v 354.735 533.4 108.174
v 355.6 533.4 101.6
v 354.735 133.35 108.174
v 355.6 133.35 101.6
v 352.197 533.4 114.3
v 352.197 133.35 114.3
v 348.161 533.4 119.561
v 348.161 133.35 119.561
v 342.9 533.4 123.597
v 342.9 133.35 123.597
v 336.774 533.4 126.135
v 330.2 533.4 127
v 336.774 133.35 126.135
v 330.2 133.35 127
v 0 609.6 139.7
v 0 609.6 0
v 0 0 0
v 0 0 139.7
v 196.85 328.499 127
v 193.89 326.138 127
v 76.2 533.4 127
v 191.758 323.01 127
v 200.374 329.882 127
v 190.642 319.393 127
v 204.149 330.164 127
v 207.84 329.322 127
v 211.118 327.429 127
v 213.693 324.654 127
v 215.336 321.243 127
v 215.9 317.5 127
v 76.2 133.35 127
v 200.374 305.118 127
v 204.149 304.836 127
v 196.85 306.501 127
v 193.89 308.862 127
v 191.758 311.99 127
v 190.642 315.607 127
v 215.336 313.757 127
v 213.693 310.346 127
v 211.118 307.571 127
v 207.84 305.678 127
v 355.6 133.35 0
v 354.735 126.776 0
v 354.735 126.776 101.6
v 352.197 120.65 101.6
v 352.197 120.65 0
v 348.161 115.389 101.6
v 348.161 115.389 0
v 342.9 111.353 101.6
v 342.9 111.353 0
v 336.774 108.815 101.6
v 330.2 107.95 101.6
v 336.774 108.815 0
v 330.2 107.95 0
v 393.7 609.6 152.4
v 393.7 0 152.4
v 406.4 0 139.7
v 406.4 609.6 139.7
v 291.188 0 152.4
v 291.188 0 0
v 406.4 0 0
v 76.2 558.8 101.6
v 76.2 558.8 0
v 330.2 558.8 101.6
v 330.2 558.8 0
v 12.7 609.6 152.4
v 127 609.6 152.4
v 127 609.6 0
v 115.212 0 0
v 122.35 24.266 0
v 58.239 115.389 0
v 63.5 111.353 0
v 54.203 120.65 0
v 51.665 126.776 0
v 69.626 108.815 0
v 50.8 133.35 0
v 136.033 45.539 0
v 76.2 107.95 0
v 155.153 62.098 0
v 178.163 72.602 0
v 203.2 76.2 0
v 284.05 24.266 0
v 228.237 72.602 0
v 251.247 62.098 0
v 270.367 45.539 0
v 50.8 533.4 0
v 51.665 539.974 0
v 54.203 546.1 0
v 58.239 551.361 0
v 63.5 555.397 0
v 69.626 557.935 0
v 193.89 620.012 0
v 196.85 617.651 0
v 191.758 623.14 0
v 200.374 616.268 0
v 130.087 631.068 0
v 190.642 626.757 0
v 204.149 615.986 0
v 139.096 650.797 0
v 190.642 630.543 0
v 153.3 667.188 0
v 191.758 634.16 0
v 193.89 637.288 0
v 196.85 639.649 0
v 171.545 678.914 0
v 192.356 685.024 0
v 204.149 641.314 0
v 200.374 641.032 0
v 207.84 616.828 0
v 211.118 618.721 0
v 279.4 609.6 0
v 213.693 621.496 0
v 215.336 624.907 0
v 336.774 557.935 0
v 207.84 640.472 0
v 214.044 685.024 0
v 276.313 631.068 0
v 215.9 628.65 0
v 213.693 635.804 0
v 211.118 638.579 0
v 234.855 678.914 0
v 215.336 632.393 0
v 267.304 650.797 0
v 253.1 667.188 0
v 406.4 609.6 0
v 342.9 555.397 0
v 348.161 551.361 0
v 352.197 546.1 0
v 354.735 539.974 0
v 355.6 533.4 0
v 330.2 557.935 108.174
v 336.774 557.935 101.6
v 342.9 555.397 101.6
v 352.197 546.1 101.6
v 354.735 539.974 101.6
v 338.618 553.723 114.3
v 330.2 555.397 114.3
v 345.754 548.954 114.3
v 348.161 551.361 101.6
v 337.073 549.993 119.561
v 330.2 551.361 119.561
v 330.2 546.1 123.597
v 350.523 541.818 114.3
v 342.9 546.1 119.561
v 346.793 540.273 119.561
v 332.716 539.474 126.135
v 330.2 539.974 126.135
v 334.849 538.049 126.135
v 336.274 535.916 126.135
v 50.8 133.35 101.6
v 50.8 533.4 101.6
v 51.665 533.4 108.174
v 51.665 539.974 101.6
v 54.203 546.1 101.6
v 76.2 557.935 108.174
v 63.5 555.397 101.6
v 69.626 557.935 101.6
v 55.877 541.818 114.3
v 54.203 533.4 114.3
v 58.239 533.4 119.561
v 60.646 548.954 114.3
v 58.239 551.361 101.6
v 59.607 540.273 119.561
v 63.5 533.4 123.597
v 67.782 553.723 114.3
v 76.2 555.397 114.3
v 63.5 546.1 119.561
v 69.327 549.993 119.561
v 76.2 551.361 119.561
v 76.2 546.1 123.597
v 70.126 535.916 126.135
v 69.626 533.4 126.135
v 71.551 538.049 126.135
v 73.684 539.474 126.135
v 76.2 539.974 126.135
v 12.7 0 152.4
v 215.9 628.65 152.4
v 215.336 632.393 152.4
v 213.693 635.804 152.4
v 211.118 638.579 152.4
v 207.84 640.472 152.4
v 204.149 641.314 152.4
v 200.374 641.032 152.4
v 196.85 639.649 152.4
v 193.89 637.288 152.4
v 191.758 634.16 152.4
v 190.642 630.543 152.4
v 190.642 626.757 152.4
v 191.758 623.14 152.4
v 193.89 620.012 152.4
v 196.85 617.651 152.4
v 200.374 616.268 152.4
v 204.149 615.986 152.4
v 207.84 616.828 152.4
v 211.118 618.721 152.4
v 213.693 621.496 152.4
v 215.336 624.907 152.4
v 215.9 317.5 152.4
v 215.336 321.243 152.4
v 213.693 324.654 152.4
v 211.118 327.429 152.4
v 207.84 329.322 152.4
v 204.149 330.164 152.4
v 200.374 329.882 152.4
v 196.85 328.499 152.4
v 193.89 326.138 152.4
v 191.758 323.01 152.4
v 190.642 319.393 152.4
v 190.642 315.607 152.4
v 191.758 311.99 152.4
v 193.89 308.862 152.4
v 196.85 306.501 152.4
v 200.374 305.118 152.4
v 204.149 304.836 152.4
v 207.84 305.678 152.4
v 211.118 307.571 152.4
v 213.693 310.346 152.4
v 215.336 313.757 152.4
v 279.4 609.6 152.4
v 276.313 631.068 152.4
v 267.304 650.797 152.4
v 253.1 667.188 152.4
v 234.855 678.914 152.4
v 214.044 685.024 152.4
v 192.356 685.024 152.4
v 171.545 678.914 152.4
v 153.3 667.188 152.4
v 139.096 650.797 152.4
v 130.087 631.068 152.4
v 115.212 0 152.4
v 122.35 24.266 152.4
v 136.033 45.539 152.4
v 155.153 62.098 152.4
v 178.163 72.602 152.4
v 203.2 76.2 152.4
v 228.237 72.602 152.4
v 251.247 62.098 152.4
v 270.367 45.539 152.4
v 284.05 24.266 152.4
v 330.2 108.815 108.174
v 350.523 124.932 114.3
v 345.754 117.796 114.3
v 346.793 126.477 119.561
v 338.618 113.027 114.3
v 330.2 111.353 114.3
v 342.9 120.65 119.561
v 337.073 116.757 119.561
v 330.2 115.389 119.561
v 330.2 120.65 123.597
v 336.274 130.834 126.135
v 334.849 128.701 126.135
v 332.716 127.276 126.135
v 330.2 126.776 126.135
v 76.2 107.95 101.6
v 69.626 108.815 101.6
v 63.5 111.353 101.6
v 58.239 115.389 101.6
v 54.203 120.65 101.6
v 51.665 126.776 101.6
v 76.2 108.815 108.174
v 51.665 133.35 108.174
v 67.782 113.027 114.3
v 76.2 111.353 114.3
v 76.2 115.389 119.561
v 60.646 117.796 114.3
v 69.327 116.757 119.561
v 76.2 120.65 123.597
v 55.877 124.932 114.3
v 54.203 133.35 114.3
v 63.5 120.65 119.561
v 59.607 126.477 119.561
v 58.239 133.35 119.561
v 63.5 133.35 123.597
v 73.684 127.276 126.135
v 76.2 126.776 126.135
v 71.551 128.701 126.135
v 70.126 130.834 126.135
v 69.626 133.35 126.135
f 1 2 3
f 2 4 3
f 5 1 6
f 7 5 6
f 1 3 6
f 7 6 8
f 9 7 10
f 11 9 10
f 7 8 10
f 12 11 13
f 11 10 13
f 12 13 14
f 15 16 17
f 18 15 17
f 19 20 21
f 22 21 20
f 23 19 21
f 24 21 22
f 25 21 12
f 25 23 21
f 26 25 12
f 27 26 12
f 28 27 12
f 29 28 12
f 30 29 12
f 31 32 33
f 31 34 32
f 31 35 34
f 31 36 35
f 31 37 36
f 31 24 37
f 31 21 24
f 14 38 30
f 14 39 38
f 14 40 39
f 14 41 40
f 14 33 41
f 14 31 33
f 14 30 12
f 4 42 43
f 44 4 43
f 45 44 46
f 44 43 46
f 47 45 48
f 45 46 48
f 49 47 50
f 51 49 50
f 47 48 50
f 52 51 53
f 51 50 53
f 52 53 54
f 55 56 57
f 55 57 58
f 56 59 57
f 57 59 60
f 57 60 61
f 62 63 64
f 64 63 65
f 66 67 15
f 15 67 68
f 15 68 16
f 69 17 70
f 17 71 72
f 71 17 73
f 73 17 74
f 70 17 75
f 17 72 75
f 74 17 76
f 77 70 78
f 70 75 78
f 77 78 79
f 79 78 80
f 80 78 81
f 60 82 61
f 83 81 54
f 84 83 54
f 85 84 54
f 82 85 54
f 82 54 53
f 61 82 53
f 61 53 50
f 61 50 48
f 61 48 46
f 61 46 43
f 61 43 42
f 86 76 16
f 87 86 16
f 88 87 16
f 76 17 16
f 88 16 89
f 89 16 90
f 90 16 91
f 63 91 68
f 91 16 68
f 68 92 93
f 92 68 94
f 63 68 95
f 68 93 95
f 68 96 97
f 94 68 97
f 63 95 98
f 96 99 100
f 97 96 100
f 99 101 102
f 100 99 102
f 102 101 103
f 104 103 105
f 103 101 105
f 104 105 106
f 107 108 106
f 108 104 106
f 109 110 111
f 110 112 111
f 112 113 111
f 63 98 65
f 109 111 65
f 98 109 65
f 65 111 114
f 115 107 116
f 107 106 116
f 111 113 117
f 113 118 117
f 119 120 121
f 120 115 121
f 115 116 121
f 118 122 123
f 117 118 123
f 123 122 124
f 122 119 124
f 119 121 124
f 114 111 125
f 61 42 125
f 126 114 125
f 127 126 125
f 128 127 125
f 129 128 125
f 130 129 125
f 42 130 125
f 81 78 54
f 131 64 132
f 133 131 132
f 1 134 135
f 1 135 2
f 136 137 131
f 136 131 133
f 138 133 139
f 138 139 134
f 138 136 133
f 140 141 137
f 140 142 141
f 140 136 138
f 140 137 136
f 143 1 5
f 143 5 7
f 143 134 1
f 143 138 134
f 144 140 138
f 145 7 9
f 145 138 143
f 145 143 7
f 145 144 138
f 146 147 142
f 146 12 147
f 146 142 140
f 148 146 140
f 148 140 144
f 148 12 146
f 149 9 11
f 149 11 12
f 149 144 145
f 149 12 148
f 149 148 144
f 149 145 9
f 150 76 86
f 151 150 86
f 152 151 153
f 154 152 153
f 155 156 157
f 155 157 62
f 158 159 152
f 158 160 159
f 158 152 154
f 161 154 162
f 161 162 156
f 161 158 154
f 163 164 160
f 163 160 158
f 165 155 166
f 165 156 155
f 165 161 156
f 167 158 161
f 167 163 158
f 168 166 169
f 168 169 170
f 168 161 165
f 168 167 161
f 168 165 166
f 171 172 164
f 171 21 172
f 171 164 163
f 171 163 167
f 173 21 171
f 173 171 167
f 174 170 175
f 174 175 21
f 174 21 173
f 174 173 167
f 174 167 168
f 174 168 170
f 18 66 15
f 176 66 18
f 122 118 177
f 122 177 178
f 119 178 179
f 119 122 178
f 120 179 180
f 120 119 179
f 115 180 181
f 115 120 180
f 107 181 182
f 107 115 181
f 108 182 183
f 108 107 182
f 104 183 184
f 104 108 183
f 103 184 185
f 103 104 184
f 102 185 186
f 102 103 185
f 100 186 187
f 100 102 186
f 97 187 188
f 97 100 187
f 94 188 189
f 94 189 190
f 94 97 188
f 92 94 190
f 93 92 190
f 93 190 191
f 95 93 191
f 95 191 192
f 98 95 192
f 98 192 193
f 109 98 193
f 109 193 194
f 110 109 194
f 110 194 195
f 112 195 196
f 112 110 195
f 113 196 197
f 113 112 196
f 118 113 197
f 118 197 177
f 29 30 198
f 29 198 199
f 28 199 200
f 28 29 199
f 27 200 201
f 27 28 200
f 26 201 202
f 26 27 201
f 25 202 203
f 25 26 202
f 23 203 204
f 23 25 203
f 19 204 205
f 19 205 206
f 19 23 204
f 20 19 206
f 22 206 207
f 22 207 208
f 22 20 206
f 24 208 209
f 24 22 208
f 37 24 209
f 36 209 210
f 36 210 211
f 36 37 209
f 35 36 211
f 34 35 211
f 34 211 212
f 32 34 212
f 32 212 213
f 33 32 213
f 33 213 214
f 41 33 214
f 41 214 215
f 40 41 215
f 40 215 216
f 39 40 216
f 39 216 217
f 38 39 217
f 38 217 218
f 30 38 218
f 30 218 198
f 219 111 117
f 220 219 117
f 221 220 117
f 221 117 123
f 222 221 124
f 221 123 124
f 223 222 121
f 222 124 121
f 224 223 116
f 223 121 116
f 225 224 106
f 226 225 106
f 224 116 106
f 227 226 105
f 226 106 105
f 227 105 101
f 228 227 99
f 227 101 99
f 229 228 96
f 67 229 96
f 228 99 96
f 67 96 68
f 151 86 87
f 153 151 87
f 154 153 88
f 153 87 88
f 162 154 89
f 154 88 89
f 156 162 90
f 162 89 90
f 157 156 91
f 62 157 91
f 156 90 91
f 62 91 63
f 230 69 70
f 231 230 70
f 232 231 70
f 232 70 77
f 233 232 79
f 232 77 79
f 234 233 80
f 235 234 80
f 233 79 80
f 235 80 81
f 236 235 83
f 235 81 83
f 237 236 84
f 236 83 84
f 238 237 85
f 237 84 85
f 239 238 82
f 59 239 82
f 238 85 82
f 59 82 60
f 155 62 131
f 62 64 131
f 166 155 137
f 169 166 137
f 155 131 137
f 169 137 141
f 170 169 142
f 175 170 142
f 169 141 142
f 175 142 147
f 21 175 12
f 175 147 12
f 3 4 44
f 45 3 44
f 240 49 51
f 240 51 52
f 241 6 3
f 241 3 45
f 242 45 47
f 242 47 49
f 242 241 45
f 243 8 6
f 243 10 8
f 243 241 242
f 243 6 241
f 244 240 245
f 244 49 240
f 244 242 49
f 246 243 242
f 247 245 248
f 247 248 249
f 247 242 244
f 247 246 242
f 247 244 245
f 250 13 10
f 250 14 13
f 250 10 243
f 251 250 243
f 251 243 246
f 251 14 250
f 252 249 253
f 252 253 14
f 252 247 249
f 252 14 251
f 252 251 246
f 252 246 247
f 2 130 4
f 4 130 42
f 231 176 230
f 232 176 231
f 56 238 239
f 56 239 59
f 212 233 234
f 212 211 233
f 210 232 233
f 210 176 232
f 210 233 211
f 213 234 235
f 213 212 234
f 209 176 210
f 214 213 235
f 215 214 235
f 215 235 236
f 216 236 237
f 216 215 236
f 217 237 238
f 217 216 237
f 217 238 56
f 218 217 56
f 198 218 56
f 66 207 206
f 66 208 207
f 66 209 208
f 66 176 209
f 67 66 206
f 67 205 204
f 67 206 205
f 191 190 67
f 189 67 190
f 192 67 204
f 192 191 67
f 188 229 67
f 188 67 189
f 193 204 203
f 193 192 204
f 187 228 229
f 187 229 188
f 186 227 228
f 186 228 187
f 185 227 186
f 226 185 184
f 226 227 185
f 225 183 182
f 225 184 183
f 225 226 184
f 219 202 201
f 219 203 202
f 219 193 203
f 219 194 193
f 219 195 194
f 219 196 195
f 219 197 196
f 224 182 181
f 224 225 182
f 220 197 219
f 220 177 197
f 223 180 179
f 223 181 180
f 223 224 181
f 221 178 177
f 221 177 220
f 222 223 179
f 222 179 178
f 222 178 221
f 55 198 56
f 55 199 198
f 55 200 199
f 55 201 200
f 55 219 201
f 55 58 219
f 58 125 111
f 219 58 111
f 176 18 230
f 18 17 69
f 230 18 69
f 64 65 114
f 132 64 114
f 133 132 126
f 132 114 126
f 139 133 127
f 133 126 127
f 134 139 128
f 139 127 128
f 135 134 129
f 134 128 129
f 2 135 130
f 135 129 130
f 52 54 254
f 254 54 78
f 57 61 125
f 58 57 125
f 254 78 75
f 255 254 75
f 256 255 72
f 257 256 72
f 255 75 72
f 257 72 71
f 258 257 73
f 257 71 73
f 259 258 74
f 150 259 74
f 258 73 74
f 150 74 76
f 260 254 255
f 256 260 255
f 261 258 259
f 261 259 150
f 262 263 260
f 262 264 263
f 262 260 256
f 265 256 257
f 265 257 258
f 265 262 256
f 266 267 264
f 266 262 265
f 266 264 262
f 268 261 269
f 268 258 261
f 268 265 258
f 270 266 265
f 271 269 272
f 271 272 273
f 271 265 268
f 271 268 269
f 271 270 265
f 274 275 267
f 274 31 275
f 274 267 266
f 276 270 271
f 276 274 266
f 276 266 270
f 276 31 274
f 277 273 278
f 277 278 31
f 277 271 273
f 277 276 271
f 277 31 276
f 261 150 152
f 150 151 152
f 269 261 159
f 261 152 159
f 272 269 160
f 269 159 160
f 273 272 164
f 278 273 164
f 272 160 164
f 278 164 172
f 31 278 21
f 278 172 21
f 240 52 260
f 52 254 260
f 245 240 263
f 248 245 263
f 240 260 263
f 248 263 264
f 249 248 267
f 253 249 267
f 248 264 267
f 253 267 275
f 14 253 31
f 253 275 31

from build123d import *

# Parameters (mm, degrees)
F0_R     = 12.7
F1_DEPTH = 152.4
F3_DEPTH = 127
F4_R     = 25.4
F5_SIZE  = 12.7


with BuildPart() as f1:
    # F0 (on Top) → F1 (new body)
    with BuildSketch(Plane.XY):
        with BuildLine():
            Line((127, 609.6), (0, 609.6))
            Line((0, 609.6), (0, 0))
            Line((0, 0), (115.211819, 0))
            ThreePointArc((115.211819, 0), (203.2, 76.2), (291.188181, 0))
            Line((291.188181, 0), (406.4, 0))
            Line((406.4, 0), (406.4, 609.6))
            Line((406.4, 609.6), (279.4, 609.6))
            ThreePointArc((279.4, 609.6), (203.2, 685.8), (127, 609.6))
        make_face()
        with Locations((203.2, 317.5)):
            Circle(F0_R, mode=Mode.SUBTRACT)
        with Locations((203.2, 628.65)):
            Circle(F0_R, mode=Mode.SUBTRACT)
    extrude(amount=F1_DEPTH)

    # F2 (on face) → F3 (cut)
    with BuildSketch(Plane(origin=(0, 0, 0), x_dir=(1, 0, 0), z_dir=(0, 0, -1))):
        with BuildLine():
            ThreePointArc((76.2, -107.95), (58.239488, -115.389488), (50.8, -133.35))
            Line((50.8, -133.35), (50.8, -533.4))
            ThreePointArc((50.8, -533.4), (58.239488, -551.360512), (76.2, -558.8))
            Line((76.2, -558.8), (330.2, -558.8))
            ThreePointArc((330.2, -558.8), (348.160512, -551.360512), (355.6, -533.4))
            Line((355.6, -533.4), (355.6, -133.35))
            ThreePointArc((355.6, -133.35), (348.160512, -115.389488), (330.2, -107.95))
            Line((330.2, -107.95), (76.2, -107.95))
        make_face()
    extrude(amount=-F3_DEPTH, mode=Mode.SUBTRACT)

    # F4
    f4_edges = [f1.edges().sort_by_distance(p)[0] for p in [
        (50.8, 333.375, 127),
    ]]
    fillet(f4_edges, radius=F4_R)

    # F5
    f5_edges = [f1.edges().sort_by_distance(p)[0] for p in [
        (406.4, 304.8, 152.4),
        (0, 304.8, 152.4),
    ]]
    chamfer(f5_edges, length=F5_SIZE)


solid = f1.part
